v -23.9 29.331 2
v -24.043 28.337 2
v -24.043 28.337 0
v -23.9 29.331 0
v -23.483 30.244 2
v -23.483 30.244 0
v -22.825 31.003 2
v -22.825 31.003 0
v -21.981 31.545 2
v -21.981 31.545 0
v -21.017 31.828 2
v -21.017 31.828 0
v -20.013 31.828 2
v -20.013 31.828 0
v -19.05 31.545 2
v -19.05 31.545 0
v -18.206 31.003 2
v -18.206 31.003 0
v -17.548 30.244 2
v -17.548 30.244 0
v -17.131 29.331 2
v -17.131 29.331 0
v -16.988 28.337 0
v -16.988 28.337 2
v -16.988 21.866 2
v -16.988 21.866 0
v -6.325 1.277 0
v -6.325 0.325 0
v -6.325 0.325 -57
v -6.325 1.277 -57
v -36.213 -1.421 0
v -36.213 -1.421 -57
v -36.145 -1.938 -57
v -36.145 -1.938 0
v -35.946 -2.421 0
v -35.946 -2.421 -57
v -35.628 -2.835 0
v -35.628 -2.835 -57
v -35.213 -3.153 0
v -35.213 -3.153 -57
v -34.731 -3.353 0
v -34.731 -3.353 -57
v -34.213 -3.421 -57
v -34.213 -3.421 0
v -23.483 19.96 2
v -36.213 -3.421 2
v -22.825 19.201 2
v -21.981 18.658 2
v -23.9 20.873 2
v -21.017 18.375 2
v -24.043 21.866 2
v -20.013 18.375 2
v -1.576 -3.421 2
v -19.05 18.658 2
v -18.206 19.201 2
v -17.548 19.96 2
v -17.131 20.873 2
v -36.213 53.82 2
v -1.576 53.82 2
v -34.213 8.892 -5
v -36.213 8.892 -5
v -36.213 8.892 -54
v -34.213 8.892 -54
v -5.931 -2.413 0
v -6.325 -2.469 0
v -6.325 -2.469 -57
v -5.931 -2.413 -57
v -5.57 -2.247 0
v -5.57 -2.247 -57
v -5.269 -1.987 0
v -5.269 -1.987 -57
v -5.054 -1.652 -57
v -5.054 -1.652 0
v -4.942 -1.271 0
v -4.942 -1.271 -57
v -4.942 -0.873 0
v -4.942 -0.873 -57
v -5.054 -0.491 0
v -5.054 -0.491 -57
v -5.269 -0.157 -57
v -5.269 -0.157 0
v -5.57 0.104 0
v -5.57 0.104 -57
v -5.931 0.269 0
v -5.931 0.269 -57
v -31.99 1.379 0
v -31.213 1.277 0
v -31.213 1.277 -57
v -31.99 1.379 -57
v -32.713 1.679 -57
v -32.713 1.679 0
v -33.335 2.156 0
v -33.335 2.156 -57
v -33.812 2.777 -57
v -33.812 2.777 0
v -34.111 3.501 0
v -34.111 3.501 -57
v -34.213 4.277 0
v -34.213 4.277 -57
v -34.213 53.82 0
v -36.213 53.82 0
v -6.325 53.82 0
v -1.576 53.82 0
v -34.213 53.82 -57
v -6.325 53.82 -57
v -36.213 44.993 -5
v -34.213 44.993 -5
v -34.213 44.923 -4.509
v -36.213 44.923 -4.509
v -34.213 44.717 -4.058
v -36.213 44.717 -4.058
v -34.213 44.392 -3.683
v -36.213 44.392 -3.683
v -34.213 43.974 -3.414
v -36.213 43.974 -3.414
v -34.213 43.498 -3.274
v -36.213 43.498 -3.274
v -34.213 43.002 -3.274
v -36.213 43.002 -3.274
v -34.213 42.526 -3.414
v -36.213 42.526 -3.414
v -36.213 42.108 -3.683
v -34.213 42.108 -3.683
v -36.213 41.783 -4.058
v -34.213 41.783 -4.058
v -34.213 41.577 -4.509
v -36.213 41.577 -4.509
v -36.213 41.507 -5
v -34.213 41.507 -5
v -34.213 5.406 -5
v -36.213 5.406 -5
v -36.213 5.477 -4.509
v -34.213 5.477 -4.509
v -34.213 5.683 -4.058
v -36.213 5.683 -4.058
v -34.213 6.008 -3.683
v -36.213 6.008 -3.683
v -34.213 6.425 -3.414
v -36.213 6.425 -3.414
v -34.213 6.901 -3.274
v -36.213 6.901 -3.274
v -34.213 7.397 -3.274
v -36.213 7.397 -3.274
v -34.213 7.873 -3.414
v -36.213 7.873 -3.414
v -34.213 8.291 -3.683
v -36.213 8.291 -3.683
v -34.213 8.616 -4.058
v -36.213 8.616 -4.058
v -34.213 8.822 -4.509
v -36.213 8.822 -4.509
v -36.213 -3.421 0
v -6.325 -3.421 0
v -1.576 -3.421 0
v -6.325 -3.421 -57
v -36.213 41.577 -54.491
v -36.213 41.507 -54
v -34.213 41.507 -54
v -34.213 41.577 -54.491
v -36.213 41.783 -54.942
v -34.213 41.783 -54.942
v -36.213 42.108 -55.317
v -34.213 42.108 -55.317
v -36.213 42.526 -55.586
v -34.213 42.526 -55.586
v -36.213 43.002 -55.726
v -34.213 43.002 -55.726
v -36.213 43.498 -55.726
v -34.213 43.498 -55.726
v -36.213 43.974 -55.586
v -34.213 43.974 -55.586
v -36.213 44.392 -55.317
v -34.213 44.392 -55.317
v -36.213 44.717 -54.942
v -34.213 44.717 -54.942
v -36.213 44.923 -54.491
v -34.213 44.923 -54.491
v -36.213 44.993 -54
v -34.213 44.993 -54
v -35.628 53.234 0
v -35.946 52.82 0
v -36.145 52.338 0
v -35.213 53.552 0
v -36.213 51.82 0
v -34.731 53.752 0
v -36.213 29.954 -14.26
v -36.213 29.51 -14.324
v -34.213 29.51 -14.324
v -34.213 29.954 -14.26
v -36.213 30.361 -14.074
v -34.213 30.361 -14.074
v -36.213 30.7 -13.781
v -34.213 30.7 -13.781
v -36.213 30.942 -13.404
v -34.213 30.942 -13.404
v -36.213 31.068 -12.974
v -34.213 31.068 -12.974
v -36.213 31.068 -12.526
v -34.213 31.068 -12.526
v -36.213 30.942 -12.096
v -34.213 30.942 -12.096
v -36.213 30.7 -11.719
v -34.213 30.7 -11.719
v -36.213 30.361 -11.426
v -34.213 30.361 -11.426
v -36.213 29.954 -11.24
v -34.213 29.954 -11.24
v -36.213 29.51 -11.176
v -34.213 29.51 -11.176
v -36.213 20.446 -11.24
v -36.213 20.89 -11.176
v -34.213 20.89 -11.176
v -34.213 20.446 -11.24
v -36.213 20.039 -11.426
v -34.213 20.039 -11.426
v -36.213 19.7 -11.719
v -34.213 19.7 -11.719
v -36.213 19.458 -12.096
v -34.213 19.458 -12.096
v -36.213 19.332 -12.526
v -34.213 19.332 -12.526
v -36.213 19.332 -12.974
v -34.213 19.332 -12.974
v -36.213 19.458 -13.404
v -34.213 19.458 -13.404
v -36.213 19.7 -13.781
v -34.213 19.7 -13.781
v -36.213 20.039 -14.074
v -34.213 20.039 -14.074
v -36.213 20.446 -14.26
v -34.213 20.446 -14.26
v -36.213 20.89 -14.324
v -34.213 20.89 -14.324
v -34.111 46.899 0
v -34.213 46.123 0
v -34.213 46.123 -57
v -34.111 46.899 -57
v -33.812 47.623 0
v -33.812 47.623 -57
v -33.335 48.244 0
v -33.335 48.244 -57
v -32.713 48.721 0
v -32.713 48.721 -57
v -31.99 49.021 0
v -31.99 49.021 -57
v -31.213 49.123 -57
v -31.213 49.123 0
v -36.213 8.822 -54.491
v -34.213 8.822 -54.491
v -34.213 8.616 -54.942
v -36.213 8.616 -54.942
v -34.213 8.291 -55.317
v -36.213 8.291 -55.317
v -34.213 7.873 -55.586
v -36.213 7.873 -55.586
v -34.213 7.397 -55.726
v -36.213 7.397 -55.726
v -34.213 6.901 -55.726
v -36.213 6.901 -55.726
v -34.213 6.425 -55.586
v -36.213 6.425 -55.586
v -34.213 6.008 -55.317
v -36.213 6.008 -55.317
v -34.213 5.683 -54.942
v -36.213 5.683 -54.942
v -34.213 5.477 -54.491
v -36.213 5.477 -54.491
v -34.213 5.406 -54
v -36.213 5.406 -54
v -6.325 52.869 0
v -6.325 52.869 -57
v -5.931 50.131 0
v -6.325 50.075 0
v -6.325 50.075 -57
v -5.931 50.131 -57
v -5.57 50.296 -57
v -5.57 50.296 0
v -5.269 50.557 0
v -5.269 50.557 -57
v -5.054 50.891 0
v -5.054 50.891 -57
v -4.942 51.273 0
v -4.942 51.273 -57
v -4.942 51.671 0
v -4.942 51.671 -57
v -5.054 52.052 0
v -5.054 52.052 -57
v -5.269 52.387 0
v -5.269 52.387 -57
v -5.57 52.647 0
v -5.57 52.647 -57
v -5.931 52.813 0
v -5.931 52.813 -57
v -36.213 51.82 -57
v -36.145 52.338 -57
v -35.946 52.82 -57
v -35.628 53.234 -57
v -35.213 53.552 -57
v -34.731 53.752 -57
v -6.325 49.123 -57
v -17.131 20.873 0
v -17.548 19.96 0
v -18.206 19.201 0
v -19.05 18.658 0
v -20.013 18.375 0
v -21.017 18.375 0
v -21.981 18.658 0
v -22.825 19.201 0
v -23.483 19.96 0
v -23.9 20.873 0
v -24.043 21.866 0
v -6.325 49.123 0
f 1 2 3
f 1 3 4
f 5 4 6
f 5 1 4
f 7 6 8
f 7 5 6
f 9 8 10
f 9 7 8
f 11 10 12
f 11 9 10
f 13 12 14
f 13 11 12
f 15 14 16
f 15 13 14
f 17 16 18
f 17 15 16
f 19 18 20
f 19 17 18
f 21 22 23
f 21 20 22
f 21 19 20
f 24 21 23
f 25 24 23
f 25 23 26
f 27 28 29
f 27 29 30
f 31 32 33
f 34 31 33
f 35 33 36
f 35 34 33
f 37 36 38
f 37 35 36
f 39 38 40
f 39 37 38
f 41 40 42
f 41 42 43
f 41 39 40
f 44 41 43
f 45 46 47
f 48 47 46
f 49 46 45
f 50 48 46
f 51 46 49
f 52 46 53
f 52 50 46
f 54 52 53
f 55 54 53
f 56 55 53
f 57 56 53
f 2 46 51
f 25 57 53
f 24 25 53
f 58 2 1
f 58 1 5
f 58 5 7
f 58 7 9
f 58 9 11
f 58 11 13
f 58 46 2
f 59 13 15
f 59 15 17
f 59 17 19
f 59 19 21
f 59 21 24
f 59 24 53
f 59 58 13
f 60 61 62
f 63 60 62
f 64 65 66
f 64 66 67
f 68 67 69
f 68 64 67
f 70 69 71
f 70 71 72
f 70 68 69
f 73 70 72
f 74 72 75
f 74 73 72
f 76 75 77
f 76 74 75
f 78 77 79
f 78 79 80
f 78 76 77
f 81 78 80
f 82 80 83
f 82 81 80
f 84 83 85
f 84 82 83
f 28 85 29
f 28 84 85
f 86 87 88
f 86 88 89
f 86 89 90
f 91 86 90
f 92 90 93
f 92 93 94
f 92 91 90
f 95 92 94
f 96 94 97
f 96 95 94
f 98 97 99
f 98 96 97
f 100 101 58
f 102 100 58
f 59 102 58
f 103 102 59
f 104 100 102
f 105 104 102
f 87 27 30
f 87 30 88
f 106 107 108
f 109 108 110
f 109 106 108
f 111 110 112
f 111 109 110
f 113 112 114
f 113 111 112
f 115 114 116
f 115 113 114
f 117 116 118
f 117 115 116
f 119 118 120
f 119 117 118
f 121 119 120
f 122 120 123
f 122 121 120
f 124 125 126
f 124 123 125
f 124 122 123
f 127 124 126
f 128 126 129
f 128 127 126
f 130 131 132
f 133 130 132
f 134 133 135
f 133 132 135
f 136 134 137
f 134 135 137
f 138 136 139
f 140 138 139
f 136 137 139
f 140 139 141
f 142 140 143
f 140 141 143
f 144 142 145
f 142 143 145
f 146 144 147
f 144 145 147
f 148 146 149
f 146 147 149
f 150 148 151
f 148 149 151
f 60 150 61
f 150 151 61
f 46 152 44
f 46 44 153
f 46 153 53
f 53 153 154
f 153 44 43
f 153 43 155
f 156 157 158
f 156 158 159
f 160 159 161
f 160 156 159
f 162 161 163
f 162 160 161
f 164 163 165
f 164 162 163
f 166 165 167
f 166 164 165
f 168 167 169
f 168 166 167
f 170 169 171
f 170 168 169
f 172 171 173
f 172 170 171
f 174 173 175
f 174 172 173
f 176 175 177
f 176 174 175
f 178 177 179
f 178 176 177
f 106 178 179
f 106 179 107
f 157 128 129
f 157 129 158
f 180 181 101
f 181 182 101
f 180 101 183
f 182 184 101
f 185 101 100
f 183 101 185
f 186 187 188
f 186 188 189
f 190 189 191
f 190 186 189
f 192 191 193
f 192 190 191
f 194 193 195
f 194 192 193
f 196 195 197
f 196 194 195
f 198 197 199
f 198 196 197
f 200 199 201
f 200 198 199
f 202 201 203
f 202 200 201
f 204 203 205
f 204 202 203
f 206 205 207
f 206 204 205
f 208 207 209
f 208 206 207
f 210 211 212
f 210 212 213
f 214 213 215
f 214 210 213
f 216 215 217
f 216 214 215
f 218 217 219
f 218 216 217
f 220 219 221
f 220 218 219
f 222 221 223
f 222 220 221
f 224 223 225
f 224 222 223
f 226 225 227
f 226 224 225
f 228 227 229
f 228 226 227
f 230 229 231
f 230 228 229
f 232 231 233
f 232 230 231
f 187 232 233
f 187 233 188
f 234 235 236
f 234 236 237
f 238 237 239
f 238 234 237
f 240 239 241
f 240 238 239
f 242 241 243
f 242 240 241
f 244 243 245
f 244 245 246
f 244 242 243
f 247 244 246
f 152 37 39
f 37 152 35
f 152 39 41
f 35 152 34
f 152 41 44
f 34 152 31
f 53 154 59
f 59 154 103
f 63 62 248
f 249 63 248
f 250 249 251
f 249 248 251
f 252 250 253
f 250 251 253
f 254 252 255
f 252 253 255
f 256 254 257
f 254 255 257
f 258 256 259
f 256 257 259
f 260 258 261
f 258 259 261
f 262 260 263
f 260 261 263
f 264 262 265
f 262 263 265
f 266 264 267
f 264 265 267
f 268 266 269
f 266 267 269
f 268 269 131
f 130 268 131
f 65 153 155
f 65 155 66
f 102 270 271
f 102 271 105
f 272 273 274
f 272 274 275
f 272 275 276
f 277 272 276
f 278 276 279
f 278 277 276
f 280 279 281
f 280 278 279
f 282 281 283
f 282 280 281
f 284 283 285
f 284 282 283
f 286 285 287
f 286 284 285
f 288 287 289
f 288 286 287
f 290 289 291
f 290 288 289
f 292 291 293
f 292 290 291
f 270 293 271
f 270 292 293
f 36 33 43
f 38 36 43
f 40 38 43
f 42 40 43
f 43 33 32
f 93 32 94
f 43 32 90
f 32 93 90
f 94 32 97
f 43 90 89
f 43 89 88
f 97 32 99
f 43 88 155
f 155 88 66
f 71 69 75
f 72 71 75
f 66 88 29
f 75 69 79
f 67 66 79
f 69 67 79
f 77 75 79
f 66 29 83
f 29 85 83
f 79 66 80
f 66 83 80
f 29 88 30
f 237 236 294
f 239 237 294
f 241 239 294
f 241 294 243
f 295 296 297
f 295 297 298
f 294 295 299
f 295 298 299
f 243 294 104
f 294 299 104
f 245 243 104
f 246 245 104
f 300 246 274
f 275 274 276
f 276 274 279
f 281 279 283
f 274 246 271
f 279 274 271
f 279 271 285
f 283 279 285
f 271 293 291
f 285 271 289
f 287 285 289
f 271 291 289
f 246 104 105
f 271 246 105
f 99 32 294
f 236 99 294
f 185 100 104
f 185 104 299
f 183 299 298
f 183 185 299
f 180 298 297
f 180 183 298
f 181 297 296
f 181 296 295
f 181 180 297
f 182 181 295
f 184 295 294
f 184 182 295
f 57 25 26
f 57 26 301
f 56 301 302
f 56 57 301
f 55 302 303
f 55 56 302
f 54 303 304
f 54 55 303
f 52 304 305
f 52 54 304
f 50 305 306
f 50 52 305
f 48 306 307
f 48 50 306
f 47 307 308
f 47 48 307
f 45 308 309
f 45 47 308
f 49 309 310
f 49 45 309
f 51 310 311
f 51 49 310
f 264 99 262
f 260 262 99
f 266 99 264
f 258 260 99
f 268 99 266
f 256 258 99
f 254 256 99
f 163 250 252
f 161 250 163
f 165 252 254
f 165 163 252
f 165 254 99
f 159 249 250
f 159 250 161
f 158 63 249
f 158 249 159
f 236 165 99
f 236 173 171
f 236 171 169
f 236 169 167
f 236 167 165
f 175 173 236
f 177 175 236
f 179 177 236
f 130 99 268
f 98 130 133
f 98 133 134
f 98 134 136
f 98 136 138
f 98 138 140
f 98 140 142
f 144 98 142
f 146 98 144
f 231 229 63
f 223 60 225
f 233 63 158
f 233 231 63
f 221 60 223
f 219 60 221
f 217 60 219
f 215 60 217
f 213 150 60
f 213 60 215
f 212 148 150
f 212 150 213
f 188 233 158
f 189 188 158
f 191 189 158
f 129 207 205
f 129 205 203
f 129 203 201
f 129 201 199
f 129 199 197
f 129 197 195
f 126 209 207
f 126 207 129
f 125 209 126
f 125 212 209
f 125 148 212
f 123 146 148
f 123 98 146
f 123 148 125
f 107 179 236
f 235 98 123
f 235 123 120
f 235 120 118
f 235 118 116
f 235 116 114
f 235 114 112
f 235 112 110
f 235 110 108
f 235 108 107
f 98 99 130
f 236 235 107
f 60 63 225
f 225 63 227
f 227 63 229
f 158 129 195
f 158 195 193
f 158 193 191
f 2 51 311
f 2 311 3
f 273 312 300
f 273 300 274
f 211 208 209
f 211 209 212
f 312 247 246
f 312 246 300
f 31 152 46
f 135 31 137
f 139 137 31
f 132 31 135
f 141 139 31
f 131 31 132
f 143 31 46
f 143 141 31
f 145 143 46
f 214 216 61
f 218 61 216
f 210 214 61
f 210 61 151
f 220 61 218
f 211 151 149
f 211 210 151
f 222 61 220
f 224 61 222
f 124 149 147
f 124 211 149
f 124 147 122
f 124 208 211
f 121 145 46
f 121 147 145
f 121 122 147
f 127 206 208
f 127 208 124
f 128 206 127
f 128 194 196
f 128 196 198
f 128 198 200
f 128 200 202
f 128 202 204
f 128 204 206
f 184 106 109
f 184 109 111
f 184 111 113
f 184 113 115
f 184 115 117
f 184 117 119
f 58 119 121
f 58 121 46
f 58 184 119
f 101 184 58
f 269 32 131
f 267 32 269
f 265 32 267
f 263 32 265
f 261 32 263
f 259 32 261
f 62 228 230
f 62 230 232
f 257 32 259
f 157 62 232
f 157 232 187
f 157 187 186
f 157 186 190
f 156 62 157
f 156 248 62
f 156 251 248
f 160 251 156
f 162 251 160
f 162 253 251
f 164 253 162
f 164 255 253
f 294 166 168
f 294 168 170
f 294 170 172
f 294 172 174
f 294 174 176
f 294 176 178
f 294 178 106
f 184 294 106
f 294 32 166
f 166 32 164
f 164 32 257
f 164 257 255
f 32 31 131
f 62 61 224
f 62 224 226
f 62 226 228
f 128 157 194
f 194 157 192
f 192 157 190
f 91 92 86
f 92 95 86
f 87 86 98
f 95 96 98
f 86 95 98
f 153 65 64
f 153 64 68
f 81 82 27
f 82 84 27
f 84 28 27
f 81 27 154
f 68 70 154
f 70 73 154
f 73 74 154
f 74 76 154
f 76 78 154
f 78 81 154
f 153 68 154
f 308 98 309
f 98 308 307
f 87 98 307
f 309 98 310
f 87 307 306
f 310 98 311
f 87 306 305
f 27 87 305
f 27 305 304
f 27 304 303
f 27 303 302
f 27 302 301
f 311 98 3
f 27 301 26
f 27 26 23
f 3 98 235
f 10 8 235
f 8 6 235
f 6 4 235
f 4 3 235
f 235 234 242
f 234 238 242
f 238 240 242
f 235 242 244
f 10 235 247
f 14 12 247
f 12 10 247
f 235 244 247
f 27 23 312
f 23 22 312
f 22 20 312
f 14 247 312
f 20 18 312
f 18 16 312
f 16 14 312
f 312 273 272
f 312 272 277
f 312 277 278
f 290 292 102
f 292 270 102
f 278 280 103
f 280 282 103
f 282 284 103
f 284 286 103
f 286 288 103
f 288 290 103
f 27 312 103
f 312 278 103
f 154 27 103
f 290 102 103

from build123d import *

# Parameters (mm, degrees)
CROQUIS1_W              = 34.637221952
CROQUIS1_H              = 57.24088581
SALIENTE_EXTRUIR1_DEPTH = 2
SALIENTE_EXTRUIR2_DEPTH = 57
CORTAR_EXTRUIR1_DEPTH   = 3
CORTAR_EXTRUIR2_DEPTH   = 6
CORTAR_EXTRUIR3_REACH   = 61


with BuildPart() as part:
    # Croquis1 → Saliente-Extruir1 (new body)
    with BuildSketch(Plane.XY):
        with Locations((-18.894886619, 25.199603339)):
            Rectangle(CROQUIS1_W, CROQUIS1_H)
    extrude(amount=SALIENTE_EXTRUIR1_DEPTH)

    # Croquis3 → Saliente-Extruir2 (add)
    with BuildSketch(Plane(origin=(0, 0, 0), x_dir=(-1, 0, 0), z_dir=(0, 0, -1))):
        with BuildLine():
            Line((6.325110646, 52.869153193), (6.325110646, 53.820046244))
            Line((6.325110646, 53.820046244), (34.213497595, 53.820046244))
            ThreePointArc((34.213497595, 53.820046244), (35.627711158, 53.234259806), (36.213497595, 51.820046244))
            Line((36.213497595, 51.820046244), (36.213497595, -1.420839566))
            ThreePointArc((36.213497595, -1.420839566), (35.627711158, -2.835053128), (34.213497595, -3.420839566))
            Line((34.213497595, -3.420839566), (6.325110646, -3.420839566))
            Line((6.325110646, -3.420839566), (6.325110646, -2.469153193))
            ThreePointArc((6.325110646, -2.469153193), (4.927851766, -1.071894313), (6.325110646, 0.325364567))
            Line((6.325110646, 0.325364567), (6.325110646, 1.27705094))
            Line((6.325110646, 1.27705094), (31.213497595, 1.27705094))
            ThreePointArc((31.213497595, 1.27705094), (33.334817939, 2.155730596), (34.213497595, 4.27705094))
            Line((34.213497595, 4.27705094), (34.213497595, 46.12294906))
            ThreePointArc((34.213497595, 46.12294906), (33.334817939, 48.244269404), (31.213497595, 49.12294906))
            Line((31.213497595, 49.12294906), (6.325110646, 49.12294906))
            Line((6.325110646, 49.12294906), (6.325110646, 50.074635433))
            ThreePointArc((6.325110646, 50.074635433), (4.927851766, 51.471894313), (6.325110646, 52.869153193))
        make_face()
    extrude(amount=SALIENTE_EXTRUIR2_DEPTH)

    # Croquis4 → Cortar-Extruir1 (cut)
    with BuildSketch(Plane.ZY.offset(36.213497595)):
        with BuildLine():
            Line((-5, 41.506708279), (-54, 41.506708279))
            ThreePointArc((-54, 41.506708279), (-55.743291721, 43.25), (-54, 44.993291721))
            Line((-54, 44.993291721), (-5, 44.993291721))
            ThreePointArc((-5, 44.993291721), (-3.256708279, 43.25), (-5, 41.506708279))
        make_face()
        with BuildLine():
            Line((-5, 8.892498399), (-54, 8.892498399))
            ThreePointArc((-54, 8.892498399), (-55.743291721, 7.149206678), (-54, 5.405914957))
            Line((-54, 5.405914957), (-5, 5.405914957))
            ThreePointArc((-5, 5.405914957), (-3.256708279, 7.149206678), (-5, 8.892498399))
        make_face()
    extrude(amount=-CORTAR_EXTRUIR1_DEPTH, mode=Mode.SUBTRACT)

    # Croquis5 → Cortar-Extruir2 (cut)
    with BuildSketch(Plane.ZY.offset(36.213497595)):
        with BuildLine():
            Line((-14.324207984, 20.89), (-14.324207984, 29.51))
            ThreePointArc((-14.324207984, 29.51), (-12.75, 31.084207984), (-11.175792016, 29.51))
            Line((-11.175792016, 29.51), (-11.175792016, 20.89))
            ThreePointArc((-11.175792016, 20.89), (-12.75, 19.315792016), (-14.324207984, 20.89))
        make_face()
    extrude(amount=-CORTAR_EXTRUIR2_DEPTH, mode=Mode.SUBTRACT)

    # Croquis6 → Cortar-Extruir3 (cut, up to next)
    with BuildSketch(Plane.XY.offset(2), mode=Mode.PRIVATE) as cortar_extruir3_sk1:
        with BuildLine():
            Line((-24.042578579, 21.866429816), (-24.042578579, 28.336921124))
            ThreePointArc((-24.042578579, 28.336921124), (-20.515431061, 31.864068642), (-16.988283544, 28.336921124))
            Line((-16.988283544, 28.336921124), (-16.988283544, 21.866429816))
            ThreePointArc((-16.988283544, 21.866429816), (-20.515431061, 18.339282299), (-24.042578579, 21.866429816))
        make_face()
    cortar_extruir3_tool1 = extrude(cortar_extruir3_sk1.sketch, amount=-CORTAR_EXTRUIR3_REACH, mode=Mode.PRIVATE) & part.part
    add(cortar_extruir3_tool1.solids().sort_by_distance((-20.515431, 25.101675, 2))[0], mode=Mode.SUBTRACT)


solid = part.part
